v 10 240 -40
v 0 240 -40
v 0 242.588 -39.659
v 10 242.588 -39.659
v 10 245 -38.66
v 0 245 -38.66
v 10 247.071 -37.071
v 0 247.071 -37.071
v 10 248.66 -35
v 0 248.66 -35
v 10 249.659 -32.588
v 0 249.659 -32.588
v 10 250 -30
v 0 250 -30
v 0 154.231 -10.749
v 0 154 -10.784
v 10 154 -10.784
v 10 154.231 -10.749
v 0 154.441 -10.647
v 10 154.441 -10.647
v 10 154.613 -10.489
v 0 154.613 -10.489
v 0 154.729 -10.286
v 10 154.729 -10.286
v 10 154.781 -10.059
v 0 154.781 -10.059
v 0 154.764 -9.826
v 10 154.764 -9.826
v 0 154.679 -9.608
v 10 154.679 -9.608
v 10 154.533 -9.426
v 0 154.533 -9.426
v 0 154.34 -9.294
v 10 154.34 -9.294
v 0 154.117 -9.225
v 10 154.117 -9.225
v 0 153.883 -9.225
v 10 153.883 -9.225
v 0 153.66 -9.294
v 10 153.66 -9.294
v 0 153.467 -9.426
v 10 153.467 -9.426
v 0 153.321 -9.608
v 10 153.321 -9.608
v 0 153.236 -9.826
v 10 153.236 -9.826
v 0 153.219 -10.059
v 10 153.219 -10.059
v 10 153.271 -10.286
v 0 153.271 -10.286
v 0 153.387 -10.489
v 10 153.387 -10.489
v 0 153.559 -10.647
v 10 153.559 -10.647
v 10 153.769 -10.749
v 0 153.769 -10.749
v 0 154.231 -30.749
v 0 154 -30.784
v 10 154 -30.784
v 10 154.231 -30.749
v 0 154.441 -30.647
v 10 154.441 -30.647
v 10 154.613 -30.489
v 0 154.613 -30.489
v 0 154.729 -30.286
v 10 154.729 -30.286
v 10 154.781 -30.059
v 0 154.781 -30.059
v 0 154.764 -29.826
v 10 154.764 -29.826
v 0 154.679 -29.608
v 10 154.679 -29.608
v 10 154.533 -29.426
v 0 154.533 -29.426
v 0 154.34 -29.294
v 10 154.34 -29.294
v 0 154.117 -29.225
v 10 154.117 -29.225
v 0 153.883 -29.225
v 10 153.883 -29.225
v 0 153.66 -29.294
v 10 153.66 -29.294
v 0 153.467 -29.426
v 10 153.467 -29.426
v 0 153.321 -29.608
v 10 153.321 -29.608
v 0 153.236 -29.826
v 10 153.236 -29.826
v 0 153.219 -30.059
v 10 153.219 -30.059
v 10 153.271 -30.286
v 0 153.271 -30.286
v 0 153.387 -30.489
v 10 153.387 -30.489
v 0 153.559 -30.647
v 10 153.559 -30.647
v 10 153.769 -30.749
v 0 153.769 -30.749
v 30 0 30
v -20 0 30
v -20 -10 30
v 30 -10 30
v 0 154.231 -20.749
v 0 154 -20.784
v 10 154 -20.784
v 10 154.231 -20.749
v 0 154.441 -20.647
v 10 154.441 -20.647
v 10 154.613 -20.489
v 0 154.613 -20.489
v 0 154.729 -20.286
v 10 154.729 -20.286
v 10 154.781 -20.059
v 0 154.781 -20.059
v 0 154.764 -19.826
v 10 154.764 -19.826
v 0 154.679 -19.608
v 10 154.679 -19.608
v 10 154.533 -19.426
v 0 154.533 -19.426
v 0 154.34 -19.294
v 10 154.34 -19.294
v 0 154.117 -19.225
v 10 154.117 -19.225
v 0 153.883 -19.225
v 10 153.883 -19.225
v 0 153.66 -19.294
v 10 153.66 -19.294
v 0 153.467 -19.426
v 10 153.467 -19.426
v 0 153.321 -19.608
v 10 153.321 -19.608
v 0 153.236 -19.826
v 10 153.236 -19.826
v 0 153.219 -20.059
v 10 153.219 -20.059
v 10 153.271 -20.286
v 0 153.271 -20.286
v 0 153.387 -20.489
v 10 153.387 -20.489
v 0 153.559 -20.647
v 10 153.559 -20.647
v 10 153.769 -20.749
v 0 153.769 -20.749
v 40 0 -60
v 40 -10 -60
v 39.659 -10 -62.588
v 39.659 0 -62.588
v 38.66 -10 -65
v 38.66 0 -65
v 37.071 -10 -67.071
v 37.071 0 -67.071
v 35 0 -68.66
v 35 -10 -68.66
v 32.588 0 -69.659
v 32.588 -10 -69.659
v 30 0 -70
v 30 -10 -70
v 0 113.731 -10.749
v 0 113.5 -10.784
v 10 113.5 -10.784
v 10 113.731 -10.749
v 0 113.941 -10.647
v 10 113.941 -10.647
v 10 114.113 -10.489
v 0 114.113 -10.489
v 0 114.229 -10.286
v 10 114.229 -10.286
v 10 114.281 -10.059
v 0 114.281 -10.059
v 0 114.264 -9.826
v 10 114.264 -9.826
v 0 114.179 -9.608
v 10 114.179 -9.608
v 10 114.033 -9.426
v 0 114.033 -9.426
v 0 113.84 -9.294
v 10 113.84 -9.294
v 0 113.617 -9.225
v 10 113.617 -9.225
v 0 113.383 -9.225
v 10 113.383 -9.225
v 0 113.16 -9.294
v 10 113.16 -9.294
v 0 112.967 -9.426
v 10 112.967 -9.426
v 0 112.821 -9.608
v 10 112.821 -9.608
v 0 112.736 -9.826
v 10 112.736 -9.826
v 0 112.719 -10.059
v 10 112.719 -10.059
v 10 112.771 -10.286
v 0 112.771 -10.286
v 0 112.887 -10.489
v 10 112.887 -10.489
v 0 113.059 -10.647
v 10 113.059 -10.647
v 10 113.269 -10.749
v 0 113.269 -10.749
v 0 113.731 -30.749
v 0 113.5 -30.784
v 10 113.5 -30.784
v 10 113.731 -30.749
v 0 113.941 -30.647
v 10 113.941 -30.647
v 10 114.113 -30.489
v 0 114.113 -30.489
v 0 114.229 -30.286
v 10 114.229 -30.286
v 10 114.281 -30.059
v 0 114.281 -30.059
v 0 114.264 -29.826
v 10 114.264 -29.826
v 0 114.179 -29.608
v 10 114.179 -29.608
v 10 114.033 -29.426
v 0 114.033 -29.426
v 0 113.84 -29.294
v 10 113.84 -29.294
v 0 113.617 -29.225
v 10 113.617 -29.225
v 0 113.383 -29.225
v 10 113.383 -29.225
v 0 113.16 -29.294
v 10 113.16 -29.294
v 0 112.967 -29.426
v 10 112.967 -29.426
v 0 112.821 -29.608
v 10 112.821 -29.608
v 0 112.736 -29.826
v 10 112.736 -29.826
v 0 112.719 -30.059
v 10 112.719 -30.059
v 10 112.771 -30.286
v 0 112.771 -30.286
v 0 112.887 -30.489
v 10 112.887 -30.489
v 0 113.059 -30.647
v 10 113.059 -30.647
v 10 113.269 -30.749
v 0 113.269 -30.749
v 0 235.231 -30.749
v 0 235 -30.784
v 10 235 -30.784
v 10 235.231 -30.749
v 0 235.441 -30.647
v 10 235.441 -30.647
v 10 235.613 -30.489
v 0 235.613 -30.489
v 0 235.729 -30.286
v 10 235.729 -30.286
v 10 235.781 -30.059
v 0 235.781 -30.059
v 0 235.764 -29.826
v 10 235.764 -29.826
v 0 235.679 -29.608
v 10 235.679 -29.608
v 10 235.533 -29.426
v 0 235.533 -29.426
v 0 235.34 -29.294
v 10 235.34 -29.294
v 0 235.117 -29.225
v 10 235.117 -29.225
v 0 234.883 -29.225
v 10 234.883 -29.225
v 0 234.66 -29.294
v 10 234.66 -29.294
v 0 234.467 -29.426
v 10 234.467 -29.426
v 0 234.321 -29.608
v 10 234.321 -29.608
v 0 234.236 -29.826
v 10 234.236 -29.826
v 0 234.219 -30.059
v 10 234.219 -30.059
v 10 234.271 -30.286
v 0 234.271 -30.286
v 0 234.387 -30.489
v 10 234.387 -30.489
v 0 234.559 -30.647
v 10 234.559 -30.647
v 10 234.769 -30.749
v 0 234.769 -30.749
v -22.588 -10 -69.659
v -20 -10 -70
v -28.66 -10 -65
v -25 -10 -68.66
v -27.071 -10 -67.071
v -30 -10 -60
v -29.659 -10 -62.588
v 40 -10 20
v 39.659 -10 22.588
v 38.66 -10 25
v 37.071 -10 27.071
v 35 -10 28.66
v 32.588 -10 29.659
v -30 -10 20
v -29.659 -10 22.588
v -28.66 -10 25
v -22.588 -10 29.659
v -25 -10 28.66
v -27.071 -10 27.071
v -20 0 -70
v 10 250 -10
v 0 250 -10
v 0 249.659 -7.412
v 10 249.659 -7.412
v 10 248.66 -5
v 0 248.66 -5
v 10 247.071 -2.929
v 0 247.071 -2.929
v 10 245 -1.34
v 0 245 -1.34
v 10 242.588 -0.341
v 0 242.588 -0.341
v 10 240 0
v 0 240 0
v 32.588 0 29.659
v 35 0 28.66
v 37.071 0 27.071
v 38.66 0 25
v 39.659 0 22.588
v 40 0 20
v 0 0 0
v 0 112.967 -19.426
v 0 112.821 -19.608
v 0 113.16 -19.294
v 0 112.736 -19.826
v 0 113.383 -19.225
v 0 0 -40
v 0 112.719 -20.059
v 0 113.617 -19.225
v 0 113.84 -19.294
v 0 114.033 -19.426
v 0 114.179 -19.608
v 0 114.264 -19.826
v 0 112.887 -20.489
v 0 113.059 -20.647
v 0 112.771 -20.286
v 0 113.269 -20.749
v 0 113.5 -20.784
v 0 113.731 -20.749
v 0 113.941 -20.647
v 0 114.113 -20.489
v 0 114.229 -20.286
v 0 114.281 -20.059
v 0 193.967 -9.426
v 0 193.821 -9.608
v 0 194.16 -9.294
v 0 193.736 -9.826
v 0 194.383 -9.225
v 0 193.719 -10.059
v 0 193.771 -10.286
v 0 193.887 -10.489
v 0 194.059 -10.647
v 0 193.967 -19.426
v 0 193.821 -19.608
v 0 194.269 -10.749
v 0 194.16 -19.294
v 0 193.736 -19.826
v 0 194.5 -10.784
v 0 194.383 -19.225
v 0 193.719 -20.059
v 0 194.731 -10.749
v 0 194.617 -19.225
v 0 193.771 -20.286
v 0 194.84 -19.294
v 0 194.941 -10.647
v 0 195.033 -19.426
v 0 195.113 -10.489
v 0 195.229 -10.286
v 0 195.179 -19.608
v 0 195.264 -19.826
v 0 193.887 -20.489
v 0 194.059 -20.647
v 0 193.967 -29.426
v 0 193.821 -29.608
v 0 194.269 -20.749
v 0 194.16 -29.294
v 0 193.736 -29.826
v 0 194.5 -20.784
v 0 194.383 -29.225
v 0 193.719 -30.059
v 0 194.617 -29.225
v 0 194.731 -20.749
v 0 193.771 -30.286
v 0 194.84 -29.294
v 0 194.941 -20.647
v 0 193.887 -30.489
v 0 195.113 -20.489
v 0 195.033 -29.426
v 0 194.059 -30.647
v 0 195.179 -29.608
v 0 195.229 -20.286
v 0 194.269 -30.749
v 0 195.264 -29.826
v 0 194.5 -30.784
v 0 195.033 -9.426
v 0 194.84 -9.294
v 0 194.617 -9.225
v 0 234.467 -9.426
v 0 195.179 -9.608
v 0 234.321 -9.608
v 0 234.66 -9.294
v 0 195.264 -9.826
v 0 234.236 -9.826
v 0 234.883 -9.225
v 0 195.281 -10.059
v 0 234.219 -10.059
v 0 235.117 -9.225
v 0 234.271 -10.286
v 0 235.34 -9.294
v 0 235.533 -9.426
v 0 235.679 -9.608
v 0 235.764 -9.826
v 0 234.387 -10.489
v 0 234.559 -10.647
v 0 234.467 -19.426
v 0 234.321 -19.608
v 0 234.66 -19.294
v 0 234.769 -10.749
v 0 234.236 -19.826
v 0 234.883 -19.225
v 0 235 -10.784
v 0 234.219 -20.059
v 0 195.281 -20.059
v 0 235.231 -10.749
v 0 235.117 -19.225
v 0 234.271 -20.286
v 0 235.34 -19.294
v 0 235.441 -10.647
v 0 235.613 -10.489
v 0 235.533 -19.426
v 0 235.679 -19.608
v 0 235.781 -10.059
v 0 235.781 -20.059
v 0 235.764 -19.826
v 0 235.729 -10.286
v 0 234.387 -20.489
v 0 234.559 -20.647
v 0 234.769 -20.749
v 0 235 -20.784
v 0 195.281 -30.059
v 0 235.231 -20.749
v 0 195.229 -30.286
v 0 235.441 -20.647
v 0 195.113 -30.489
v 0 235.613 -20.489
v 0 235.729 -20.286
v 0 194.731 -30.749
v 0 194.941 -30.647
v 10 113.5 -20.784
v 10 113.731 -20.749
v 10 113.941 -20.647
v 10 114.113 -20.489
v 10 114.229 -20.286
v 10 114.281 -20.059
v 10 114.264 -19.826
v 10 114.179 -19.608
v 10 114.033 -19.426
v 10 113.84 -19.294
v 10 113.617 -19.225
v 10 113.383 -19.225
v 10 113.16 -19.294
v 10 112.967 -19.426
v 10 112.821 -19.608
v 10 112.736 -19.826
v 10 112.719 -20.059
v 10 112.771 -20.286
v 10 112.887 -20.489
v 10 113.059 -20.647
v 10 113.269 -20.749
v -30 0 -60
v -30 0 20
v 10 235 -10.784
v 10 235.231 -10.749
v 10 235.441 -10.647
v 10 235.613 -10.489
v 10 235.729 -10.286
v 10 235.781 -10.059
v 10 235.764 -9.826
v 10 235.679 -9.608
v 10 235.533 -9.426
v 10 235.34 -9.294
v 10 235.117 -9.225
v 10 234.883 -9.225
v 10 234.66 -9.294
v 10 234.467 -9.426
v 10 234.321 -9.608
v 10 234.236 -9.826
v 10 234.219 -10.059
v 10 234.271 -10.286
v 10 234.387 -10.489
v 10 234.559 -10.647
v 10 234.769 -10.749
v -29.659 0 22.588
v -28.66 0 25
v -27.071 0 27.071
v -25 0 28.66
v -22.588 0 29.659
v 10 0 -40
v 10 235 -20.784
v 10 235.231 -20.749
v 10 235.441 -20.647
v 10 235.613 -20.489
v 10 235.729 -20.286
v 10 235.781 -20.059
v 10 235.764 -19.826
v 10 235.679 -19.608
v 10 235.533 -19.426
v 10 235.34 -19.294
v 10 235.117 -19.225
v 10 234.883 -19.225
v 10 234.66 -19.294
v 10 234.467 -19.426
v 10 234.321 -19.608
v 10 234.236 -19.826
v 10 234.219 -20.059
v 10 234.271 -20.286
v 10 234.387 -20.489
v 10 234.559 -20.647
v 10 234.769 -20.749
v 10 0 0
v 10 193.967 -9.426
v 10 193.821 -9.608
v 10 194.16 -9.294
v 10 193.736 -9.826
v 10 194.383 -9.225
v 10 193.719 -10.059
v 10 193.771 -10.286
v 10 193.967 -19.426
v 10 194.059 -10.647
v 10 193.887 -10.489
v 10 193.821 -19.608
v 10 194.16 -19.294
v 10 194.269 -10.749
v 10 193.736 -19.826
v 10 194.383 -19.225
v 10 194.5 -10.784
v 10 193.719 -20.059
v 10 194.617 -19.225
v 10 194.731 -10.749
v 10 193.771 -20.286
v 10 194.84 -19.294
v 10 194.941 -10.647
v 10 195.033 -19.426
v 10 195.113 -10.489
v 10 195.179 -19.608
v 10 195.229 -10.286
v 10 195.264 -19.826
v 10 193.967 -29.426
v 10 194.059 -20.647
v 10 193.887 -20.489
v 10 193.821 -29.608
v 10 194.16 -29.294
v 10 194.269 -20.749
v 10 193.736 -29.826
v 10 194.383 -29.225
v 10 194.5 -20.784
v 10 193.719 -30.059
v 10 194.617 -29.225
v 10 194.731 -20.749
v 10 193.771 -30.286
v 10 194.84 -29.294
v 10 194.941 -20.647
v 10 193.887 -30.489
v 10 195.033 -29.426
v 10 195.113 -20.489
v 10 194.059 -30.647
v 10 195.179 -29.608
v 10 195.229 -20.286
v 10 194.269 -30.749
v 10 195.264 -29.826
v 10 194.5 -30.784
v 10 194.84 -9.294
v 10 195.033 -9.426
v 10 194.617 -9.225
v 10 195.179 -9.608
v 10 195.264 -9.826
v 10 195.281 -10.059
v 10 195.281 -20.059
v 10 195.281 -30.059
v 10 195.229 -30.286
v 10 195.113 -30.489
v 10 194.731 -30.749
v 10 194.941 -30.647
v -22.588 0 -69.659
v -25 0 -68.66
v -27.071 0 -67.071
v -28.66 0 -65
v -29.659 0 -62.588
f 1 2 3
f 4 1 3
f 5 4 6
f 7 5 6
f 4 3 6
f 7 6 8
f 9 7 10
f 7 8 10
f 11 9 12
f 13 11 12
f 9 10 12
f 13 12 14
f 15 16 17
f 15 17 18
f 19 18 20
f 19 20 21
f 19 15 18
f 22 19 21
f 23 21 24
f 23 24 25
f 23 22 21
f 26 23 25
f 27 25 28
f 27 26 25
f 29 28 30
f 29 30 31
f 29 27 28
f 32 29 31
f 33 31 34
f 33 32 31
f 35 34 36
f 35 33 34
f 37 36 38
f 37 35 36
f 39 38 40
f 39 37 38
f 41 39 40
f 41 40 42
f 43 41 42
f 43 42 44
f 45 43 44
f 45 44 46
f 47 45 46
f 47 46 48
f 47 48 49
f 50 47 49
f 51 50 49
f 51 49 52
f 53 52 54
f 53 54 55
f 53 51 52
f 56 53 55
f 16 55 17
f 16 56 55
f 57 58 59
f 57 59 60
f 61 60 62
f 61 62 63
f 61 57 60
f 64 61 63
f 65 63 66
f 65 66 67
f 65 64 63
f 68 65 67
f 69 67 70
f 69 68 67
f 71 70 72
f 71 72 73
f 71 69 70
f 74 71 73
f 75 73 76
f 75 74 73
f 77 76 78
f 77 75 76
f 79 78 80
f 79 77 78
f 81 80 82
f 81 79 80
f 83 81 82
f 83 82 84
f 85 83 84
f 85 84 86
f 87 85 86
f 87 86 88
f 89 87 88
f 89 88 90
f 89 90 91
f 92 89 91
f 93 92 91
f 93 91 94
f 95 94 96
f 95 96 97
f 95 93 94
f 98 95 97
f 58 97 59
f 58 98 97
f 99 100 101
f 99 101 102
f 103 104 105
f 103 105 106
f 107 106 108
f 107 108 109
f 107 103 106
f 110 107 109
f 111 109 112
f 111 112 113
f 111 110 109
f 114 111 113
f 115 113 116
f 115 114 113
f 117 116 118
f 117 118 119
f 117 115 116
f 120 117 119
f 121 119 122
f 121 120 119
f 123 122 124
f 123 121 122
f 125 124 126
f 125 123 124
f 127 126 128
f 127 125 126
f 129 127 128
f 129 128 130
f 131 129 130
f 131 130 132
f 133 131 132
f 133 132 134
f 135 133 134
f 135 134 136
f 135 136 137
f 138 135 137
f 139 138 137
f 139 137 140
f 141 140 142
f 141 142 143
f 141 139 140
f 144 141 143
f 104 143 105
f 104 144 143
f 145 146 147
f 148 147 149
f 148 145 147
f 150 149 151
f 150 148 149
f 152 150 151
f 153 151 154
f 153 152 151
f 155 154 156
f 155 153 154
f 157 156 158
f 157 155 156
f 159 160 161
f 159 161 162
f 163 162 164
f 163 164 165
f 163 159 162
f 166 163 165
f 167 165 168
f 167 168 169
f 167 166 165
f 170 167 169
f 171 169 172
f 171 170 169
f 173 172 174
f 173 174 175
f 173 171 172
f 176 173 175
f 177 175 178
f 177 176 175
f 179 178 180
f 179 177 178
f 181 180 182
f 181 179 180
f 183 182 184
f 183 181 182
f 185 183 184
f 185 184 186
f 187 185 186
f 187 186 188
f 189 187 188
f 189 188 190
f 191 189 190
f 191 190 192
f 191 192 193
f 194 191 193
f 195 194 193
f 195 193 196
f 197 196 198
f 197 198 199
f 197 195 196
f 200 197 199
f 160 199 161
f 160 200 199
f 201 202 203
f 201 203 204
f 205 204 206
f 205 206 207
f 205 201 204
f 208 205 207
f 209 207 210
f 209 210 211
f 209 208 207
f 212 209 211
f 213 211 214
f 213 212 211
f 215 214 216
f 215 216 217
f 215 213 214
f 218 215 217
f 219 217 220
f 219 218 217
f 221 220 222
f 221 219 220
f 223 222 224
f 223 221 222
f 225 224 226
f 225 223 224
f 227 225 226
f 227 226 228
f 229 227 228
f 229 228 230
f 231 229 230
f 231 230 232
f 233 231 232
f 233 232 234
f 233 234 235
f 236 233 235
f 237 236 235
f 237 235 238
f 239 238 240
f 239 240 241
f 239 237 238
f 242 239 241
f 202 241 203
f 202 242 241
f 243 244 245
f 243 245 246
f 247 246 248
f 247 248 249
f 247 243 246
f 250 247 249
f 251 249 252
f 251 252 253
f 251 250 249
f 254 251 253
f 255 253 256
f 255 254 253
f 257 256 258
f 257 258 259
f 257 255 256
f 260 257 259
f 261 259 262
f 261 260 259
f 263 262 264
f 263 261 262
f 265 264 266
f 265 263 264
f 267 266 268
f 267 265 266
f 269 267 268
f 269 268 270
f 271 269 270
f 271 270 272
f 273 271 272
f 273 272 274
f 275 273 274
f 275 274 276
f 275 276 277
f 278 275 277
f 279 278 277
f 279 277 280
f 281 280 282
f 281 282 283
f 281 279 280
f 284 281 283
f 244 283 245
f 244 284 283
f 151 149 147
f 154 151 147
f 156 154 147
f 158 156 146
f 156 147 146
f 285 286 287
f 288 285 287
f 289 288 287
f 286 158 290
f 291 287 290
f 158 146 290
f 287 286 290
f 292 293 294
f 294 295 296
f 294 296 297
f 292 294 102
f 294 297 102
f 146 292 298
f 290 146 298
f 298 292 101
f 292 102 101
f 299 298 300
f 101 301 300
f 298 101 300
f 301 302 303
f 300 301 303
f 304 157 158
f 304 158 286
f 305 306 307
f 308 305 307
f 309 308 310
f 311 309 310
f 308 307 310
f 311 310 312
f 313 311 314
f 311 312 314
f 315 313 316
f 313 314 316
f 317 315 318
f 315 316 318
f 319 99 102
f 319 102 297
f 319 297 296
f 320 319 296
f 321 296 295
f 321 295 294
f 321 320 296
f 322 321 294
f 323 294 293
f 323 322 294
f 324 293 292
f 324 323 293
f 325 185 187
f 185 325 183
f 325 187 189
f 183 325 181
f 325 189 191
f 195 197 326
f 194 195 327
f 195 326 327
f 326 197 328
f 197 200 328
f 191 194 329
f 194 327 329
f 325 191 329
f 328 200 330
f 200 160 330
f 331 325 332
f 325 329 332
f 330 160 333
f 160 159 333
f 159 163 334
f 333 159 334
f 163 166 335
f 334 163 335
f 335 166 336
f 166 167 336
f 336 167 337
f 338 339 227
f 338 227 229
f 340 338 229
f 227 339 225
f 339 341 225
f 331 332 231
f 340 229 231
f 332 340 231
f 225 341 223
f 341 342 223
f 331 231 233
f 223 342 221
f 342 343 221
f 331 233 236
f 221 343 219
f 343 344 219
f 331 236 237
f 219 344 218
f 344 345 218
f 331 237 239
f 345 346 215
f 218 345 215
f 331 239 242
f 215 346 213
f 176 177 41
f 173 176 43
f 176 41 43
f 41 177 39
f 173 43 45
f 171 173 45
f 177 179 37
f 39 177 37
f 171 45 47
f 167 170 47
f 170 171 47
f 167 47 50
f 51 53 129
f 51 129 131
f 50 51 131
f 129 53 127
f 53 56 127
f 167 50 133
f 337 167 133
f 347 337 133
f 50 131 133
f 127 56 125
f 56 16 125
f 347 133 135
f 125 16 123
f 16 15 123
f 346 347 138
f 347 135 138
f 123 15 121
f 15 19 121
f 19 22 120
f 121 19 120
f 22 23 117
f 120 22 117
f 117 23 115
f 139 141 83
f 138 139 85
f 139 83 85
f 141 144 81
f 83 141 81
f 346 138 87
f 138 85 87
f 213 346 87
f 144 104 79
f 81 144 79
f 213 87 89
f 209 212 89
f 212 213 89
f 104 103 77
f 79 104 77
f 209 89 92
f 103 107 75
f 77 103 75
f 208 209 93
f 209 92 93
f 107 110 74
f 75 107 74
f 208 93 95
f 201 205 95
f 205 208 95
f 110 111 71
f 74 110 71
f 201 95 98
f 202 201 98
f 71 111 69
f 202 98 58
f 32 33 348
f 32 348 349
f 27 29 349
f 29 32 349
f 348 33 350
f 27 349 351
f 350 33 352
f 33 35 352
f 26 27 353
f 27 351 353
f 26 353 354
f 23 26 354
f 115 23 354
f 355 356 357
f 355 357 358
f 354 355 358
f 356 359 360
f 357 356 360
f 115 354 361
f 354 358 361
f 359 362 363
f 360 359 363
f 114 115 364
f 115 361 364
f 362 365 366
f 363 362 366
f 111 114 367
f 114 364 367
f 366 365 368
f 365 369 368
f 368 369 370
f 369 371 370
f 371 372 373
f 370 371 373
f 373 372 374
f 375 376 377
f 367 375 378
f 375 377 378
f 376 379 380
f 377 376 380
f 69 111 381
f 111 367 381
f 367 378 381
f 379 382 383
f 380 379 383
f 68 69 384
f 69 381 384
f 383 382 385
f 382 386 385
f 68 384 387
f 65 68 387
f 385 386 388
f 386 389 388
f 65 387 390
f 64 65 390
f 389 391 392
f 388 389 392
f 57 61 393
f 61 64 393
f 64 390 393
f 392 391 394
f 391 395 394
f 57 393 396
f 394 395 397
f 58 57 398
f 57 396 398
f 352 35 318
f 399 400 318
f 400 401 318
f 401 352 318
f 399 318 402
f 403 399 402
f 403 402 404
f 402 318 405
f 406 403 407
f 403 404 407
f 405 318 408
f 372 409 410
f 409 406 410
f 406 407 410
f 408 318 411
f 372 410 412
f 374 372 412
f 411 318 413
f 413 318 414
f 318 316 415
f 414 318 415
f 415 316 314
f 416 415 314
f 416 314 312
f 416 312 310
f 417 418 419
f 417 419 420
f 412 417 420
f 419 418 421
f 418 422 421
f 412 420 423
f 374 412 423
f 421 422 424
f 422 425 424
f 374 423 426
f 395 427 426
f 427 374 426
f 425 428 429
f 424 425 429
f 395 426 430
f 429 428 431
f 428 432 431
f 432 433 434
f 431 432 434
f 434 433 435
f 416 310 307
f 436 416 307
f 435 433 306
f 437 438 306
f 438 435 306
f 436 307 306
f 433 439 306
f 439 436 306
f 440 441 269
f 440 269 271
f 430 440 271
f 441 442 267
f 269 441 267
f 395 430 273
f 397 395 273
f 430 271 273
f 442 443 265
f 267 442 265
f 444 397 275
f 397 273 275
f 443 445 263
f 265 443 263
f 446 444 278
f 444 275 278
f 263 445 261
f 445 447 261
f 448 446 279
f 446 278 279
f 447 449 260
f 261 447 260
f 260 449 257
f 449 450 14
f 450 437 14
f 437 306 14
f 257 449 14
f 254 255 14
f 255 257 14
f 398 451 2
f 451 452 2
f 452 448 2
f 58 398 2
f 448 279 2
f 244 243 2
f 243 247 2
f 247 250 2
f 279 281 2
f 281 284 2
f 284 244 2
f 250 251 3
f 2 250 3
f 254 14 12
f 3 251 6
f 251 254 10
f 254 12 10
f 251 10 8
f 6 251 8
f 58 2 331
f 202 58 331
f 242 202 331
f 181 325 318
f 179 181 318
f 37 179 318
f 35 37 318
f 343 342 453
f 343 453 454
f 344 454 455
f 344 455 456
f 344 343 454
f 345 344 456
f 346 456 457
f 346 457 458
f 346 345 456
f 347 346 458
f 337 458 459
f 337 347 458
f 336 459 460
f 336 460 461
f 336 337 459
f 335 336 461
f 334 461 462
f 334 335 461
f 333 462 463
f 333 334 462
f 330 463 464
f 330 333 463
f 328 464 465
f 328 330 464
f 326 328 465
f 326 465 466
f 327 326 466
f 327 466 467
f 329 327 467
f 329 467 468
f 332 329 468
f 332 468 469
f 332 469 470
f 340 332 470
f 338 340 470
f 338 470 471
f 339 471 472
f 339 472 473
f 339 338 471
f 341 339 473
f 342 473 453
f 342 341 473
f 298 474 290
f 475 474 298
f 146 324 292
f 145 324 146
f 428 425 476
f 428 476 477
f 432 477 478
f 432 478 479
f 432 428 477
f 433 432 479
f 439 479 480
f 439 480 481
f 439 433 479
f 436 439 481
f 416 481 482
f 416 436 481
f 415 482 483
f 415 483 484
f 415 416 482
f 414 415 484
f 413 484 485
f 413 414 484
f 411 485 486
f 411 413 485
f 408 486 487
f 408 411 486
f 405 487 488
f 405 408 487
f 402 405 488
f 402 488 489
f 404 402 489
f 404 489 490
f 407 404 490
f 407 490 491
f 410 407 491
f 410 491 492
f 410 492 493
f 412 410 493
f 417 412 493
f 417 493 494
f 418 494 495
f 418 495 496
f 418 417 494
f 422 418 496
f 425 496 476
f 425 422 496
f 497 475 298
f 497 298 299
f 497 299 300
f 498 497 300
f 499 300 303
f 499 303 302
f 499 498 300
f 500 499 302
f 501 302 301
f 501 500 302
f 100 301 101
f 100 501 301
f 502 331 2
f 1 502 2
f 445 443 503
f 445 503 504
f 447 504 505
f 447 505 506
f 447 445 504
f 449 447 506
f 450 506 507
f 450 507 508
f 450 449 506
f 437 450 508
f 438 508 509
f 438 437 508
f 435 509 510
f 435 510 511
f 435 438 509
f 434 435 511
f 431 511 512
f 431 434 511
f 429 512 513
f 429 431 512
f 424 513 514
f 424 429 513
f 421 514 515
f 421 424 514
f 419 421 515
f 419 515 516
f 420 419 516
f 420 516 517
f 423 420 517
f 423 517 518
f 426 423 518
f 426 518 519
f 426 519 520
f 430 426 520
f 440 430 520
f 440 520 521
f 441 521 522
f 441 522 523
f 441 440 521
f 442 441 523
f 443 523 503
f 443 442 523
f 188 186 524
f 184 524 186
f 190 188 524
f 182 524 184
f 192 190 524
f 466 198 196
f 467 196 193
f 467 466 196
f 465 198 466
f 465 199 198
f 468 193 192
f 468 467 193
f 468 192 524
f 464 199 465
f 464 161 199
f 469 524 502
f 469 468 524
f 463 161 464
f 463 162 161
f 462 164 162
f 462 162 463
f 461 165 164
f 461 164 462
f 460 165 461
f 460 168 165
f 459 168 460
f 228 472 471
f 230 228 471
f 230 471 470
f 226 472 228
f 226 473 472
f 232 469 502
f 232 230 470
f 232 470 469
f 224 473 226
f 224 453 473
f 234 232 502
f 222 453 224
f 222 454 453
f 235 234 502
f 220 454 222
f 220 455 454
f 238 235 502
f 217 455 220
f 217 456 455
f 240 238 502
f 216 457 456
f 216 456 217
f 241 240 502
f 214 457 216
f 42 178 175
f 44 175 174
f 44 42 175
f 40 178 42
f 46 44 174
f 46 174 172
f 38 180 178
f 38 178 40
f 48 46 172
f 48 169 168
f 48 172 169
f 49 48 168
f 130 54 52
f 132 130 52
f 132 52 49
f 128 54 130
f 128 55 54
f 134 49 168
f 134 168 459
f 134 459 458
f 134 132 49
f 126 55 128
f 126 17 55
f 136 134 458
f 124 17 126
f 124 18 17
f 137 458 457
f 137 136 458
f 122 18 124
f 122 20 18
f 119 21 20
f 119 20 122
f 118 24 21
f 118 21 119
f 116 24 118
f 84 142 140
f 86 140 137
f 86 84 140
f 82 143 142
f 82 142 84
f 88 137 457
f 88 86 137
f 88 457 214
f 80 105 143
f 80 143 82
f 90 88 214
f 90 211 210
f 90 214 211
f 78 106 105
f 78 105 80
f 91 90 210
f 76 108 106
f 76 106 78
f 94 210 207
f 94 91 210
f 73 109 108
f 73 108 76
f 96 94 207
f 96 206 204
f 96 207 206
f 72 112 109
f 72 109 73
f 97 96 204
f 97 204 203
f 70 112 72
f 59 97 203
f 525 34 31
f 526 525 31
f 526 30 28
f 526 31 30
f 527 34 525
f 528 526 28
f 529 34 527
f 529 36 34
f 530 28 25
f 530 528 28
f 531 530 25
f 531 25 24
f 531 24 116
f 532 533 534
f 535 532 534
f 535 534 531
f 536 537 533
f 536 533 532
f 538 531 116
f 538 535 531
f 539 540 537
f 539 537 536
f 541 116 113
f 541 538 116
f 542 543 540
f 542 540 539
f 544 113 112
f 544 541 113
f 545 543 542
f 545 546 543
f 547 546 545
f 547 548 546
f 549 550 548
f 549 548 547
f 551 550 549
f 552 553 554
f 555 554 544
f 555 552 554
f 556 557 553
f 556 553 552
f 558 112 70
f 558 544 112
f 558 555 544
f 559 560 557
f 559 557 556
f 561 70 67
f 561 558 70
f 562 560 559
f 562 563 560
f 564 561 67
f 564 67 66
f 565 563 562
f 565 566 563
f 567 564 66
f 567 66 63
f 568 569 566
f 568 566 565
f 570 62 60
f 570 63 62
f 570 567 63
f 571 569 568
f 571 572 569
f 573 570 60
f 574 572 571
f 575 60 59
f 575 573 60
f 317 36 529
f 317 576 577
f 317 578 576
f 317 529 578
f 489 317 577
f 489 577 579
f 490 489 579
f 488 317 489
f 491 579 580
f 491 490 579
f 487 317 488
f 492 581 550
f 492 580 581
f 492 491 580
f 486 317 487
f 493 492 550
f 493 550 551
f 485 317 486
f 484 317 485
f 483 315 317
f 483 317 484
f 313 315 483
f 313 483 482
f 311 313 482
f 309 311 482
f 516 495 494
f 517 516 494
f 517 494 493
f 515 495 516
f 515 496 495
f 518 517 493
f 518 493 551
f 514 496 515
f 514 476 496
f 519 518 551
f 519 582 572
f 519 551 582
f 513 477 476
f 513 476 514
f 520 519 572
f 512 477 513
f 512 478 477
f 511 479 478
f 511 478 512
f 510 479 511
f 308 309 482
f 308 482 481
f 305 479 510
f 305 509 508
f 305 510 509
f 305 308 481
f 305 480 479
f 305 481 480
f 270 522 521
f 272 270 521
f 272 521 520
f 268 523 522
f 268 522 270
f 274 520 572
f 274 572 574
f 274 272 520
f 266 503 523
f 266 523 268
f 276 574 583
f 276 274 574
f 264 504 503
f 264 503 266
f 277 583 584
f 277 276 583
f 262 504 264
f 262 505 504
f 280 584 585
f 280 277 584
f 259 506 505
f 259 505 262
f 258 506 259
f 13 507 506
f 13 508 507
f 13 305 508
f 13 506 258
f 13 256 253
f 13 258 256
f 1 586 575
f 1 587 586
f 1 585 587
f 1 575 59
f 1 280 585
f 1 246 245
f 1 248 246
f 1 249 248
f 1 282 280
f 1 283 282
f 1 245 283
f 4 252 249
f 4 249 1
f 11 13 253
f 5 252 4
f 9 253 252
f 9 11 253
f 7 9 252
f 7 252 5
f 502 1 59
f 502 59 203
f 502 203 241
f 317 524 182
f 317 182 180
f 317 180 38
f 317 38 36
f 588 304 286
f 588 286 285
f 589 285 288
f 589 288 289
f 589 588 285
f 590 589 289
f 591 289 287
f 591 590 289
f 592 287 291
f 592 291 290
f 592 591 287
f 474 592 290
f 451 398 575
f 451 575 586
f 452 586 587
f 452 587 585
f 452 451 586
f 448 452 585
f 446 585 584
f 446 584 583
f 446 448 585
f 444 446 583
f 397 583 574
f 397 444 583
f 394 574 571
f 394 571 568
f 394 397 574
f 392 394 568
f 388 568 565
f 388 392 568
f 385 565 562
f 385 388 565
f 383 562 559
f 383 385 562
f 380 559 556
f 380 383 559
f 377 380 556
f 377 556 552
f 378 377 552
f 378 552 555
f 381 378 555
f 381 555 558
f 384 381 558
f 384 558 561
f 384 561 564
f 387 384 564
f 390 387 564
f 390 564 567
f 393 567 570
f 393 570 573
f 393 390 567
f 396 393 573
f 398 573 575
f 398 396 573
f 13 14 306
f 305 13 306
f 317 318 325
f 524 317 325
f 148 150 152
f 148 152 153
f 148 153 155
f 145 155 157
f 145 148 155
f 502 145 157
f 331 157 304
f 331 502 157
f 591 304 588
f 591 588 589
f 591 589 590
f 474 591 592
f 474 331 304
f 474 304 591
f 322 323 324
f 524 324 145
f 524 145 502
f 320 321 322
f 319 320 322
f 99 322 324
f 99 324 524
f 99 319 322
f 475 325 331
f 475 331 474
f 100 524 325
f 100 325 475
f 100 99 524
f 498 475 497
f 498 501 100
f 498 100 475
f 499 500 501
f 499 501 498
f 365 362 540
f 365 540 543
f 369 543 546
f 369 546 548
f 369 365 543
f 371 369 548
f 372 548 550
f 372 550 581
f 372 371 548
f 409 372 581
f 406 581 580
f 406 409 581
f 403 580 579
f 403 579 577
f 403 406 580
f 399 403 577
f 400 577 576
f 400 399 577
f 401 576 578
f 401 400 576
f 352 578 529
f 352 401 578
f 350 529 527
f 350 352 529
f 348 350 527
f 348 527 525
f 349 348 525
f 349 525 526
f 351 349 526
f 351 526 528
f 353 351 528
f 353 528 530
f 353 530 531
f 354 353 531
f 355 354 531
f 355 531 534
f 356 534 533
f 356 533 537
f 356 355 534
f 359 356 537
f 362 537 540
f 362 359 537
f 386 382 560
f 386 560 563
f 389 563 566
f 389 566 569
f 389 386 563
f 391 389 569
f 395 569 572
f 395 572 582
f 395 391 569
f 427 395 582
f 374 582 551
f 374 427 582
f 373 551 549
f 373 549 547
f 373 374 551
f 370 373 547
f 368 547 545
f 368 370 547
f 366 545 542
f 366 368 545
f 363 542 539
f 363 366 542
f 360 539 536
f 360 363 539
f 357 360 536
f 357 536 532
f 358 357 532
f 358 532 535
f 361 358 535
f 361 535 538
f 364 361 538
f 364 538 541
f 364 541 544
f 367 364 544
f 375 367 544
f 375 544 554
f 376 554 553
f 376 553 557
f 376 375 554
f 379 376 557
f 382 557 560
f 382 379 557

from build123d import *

# Parameters (mm, degrees)
SKETCH_1_R      = 0.7835
EXTRUDE_1_DEPTH = 10
EXTRUDE_2_DEPTH = 10


with BuildPart() as part:
    # 草图1 → 凸台-拉伸1 (new body)
    with BuildSketch(Plane(origin=(0, 0, 0), x_dir=(0, 0, -1), z_dir=(1, 0, 0))):
        with BuildLine():
            Line((0, 0), (40, 0))
            Line((40, 0), (40, 240))
            ThreePointArc((40, 240), (37.071067812, 247.071067812), (30, 250))
            Line((30, 250), (10, 250))
            ThreePointArc((10, 250), (2.928932188, 247.071067812), (0, 240))
            Line((0, 240), (0, 0))
        make_face()
        with Locations((10, 235)):
            Circle(SKETCH_1_R, mode=Mode.SUBTRACT)
        with Locations((20, 235)):
            Circle(SKETCH_1_R, mode=Mode.SUBTRACT)
        with Locations((30, 235)):
            Circle(SKETCH_1_R, mode=Mode.SUBTRACT)
        with Locations((10, 194.5)):
            Circle(SKETCH_1_R, mode=Mode.SUBTRACT)
        with Locations((20, 194.5)):
            Circle(SKETCH_1_R, mode=Mode.SUBTRACT)
        with Locations((30, 194.5)):
            Circle(SKETCH_1_R, mode=Mode.SUBTRACT)
        with Locations((10, 154)):
            Circle(SKETCH_1_R, mode=Mode.SUBTRACT)
        with Locations((20, 154)):
            Circle(SKETCH_1_R, mode=Mode.SUBTRACT)
        with Locations((30, 154)):
            Circle(SKETCH_1_R, mode=Mode.SUBTRACT)
        with Locations((10, 113.5)):
            Circle(SKETCH_1_R, mode=Mode.SUBTRACT)
        with Locations((20, 113.5)):
            Circle(SKETCH_1_R, mode=Mode.SUBTRACT)
        with Locations((30, 113.5)):
            Circle(SKETCH_1_R, mode=Mode.SUBTRACT)
    extrude(amount=EXTRUDE_1_DEPTH)

    # 草图2 → 凸台-拉伸2 (add)
    with BuildSketch(Plane.XZ):
        with BuildLine():
            Line((-20, 30), (30, 30))
            ThreePointArc((30, 30), (37.071067812, 27.071067812), (40, 20))
            Line((40, 20), (40, -60))
            ThreePointArc((40, -60), (37.071067812, -67.071067812), (30, -70))
            Line((30, -70), (-20, -70))
            ThreePointArc((-20, -70), (-27.071067812, -67.071067812), (-30, -60))
            Line((-30, -60), (-30, 20))
            ThreePointArc((-30, 20), (-27.071067812, 27.071067812), (-20, 30))
        make_face()
    extrude(amount=EXTRUDE_2_DEPTH)


solid = part.part
